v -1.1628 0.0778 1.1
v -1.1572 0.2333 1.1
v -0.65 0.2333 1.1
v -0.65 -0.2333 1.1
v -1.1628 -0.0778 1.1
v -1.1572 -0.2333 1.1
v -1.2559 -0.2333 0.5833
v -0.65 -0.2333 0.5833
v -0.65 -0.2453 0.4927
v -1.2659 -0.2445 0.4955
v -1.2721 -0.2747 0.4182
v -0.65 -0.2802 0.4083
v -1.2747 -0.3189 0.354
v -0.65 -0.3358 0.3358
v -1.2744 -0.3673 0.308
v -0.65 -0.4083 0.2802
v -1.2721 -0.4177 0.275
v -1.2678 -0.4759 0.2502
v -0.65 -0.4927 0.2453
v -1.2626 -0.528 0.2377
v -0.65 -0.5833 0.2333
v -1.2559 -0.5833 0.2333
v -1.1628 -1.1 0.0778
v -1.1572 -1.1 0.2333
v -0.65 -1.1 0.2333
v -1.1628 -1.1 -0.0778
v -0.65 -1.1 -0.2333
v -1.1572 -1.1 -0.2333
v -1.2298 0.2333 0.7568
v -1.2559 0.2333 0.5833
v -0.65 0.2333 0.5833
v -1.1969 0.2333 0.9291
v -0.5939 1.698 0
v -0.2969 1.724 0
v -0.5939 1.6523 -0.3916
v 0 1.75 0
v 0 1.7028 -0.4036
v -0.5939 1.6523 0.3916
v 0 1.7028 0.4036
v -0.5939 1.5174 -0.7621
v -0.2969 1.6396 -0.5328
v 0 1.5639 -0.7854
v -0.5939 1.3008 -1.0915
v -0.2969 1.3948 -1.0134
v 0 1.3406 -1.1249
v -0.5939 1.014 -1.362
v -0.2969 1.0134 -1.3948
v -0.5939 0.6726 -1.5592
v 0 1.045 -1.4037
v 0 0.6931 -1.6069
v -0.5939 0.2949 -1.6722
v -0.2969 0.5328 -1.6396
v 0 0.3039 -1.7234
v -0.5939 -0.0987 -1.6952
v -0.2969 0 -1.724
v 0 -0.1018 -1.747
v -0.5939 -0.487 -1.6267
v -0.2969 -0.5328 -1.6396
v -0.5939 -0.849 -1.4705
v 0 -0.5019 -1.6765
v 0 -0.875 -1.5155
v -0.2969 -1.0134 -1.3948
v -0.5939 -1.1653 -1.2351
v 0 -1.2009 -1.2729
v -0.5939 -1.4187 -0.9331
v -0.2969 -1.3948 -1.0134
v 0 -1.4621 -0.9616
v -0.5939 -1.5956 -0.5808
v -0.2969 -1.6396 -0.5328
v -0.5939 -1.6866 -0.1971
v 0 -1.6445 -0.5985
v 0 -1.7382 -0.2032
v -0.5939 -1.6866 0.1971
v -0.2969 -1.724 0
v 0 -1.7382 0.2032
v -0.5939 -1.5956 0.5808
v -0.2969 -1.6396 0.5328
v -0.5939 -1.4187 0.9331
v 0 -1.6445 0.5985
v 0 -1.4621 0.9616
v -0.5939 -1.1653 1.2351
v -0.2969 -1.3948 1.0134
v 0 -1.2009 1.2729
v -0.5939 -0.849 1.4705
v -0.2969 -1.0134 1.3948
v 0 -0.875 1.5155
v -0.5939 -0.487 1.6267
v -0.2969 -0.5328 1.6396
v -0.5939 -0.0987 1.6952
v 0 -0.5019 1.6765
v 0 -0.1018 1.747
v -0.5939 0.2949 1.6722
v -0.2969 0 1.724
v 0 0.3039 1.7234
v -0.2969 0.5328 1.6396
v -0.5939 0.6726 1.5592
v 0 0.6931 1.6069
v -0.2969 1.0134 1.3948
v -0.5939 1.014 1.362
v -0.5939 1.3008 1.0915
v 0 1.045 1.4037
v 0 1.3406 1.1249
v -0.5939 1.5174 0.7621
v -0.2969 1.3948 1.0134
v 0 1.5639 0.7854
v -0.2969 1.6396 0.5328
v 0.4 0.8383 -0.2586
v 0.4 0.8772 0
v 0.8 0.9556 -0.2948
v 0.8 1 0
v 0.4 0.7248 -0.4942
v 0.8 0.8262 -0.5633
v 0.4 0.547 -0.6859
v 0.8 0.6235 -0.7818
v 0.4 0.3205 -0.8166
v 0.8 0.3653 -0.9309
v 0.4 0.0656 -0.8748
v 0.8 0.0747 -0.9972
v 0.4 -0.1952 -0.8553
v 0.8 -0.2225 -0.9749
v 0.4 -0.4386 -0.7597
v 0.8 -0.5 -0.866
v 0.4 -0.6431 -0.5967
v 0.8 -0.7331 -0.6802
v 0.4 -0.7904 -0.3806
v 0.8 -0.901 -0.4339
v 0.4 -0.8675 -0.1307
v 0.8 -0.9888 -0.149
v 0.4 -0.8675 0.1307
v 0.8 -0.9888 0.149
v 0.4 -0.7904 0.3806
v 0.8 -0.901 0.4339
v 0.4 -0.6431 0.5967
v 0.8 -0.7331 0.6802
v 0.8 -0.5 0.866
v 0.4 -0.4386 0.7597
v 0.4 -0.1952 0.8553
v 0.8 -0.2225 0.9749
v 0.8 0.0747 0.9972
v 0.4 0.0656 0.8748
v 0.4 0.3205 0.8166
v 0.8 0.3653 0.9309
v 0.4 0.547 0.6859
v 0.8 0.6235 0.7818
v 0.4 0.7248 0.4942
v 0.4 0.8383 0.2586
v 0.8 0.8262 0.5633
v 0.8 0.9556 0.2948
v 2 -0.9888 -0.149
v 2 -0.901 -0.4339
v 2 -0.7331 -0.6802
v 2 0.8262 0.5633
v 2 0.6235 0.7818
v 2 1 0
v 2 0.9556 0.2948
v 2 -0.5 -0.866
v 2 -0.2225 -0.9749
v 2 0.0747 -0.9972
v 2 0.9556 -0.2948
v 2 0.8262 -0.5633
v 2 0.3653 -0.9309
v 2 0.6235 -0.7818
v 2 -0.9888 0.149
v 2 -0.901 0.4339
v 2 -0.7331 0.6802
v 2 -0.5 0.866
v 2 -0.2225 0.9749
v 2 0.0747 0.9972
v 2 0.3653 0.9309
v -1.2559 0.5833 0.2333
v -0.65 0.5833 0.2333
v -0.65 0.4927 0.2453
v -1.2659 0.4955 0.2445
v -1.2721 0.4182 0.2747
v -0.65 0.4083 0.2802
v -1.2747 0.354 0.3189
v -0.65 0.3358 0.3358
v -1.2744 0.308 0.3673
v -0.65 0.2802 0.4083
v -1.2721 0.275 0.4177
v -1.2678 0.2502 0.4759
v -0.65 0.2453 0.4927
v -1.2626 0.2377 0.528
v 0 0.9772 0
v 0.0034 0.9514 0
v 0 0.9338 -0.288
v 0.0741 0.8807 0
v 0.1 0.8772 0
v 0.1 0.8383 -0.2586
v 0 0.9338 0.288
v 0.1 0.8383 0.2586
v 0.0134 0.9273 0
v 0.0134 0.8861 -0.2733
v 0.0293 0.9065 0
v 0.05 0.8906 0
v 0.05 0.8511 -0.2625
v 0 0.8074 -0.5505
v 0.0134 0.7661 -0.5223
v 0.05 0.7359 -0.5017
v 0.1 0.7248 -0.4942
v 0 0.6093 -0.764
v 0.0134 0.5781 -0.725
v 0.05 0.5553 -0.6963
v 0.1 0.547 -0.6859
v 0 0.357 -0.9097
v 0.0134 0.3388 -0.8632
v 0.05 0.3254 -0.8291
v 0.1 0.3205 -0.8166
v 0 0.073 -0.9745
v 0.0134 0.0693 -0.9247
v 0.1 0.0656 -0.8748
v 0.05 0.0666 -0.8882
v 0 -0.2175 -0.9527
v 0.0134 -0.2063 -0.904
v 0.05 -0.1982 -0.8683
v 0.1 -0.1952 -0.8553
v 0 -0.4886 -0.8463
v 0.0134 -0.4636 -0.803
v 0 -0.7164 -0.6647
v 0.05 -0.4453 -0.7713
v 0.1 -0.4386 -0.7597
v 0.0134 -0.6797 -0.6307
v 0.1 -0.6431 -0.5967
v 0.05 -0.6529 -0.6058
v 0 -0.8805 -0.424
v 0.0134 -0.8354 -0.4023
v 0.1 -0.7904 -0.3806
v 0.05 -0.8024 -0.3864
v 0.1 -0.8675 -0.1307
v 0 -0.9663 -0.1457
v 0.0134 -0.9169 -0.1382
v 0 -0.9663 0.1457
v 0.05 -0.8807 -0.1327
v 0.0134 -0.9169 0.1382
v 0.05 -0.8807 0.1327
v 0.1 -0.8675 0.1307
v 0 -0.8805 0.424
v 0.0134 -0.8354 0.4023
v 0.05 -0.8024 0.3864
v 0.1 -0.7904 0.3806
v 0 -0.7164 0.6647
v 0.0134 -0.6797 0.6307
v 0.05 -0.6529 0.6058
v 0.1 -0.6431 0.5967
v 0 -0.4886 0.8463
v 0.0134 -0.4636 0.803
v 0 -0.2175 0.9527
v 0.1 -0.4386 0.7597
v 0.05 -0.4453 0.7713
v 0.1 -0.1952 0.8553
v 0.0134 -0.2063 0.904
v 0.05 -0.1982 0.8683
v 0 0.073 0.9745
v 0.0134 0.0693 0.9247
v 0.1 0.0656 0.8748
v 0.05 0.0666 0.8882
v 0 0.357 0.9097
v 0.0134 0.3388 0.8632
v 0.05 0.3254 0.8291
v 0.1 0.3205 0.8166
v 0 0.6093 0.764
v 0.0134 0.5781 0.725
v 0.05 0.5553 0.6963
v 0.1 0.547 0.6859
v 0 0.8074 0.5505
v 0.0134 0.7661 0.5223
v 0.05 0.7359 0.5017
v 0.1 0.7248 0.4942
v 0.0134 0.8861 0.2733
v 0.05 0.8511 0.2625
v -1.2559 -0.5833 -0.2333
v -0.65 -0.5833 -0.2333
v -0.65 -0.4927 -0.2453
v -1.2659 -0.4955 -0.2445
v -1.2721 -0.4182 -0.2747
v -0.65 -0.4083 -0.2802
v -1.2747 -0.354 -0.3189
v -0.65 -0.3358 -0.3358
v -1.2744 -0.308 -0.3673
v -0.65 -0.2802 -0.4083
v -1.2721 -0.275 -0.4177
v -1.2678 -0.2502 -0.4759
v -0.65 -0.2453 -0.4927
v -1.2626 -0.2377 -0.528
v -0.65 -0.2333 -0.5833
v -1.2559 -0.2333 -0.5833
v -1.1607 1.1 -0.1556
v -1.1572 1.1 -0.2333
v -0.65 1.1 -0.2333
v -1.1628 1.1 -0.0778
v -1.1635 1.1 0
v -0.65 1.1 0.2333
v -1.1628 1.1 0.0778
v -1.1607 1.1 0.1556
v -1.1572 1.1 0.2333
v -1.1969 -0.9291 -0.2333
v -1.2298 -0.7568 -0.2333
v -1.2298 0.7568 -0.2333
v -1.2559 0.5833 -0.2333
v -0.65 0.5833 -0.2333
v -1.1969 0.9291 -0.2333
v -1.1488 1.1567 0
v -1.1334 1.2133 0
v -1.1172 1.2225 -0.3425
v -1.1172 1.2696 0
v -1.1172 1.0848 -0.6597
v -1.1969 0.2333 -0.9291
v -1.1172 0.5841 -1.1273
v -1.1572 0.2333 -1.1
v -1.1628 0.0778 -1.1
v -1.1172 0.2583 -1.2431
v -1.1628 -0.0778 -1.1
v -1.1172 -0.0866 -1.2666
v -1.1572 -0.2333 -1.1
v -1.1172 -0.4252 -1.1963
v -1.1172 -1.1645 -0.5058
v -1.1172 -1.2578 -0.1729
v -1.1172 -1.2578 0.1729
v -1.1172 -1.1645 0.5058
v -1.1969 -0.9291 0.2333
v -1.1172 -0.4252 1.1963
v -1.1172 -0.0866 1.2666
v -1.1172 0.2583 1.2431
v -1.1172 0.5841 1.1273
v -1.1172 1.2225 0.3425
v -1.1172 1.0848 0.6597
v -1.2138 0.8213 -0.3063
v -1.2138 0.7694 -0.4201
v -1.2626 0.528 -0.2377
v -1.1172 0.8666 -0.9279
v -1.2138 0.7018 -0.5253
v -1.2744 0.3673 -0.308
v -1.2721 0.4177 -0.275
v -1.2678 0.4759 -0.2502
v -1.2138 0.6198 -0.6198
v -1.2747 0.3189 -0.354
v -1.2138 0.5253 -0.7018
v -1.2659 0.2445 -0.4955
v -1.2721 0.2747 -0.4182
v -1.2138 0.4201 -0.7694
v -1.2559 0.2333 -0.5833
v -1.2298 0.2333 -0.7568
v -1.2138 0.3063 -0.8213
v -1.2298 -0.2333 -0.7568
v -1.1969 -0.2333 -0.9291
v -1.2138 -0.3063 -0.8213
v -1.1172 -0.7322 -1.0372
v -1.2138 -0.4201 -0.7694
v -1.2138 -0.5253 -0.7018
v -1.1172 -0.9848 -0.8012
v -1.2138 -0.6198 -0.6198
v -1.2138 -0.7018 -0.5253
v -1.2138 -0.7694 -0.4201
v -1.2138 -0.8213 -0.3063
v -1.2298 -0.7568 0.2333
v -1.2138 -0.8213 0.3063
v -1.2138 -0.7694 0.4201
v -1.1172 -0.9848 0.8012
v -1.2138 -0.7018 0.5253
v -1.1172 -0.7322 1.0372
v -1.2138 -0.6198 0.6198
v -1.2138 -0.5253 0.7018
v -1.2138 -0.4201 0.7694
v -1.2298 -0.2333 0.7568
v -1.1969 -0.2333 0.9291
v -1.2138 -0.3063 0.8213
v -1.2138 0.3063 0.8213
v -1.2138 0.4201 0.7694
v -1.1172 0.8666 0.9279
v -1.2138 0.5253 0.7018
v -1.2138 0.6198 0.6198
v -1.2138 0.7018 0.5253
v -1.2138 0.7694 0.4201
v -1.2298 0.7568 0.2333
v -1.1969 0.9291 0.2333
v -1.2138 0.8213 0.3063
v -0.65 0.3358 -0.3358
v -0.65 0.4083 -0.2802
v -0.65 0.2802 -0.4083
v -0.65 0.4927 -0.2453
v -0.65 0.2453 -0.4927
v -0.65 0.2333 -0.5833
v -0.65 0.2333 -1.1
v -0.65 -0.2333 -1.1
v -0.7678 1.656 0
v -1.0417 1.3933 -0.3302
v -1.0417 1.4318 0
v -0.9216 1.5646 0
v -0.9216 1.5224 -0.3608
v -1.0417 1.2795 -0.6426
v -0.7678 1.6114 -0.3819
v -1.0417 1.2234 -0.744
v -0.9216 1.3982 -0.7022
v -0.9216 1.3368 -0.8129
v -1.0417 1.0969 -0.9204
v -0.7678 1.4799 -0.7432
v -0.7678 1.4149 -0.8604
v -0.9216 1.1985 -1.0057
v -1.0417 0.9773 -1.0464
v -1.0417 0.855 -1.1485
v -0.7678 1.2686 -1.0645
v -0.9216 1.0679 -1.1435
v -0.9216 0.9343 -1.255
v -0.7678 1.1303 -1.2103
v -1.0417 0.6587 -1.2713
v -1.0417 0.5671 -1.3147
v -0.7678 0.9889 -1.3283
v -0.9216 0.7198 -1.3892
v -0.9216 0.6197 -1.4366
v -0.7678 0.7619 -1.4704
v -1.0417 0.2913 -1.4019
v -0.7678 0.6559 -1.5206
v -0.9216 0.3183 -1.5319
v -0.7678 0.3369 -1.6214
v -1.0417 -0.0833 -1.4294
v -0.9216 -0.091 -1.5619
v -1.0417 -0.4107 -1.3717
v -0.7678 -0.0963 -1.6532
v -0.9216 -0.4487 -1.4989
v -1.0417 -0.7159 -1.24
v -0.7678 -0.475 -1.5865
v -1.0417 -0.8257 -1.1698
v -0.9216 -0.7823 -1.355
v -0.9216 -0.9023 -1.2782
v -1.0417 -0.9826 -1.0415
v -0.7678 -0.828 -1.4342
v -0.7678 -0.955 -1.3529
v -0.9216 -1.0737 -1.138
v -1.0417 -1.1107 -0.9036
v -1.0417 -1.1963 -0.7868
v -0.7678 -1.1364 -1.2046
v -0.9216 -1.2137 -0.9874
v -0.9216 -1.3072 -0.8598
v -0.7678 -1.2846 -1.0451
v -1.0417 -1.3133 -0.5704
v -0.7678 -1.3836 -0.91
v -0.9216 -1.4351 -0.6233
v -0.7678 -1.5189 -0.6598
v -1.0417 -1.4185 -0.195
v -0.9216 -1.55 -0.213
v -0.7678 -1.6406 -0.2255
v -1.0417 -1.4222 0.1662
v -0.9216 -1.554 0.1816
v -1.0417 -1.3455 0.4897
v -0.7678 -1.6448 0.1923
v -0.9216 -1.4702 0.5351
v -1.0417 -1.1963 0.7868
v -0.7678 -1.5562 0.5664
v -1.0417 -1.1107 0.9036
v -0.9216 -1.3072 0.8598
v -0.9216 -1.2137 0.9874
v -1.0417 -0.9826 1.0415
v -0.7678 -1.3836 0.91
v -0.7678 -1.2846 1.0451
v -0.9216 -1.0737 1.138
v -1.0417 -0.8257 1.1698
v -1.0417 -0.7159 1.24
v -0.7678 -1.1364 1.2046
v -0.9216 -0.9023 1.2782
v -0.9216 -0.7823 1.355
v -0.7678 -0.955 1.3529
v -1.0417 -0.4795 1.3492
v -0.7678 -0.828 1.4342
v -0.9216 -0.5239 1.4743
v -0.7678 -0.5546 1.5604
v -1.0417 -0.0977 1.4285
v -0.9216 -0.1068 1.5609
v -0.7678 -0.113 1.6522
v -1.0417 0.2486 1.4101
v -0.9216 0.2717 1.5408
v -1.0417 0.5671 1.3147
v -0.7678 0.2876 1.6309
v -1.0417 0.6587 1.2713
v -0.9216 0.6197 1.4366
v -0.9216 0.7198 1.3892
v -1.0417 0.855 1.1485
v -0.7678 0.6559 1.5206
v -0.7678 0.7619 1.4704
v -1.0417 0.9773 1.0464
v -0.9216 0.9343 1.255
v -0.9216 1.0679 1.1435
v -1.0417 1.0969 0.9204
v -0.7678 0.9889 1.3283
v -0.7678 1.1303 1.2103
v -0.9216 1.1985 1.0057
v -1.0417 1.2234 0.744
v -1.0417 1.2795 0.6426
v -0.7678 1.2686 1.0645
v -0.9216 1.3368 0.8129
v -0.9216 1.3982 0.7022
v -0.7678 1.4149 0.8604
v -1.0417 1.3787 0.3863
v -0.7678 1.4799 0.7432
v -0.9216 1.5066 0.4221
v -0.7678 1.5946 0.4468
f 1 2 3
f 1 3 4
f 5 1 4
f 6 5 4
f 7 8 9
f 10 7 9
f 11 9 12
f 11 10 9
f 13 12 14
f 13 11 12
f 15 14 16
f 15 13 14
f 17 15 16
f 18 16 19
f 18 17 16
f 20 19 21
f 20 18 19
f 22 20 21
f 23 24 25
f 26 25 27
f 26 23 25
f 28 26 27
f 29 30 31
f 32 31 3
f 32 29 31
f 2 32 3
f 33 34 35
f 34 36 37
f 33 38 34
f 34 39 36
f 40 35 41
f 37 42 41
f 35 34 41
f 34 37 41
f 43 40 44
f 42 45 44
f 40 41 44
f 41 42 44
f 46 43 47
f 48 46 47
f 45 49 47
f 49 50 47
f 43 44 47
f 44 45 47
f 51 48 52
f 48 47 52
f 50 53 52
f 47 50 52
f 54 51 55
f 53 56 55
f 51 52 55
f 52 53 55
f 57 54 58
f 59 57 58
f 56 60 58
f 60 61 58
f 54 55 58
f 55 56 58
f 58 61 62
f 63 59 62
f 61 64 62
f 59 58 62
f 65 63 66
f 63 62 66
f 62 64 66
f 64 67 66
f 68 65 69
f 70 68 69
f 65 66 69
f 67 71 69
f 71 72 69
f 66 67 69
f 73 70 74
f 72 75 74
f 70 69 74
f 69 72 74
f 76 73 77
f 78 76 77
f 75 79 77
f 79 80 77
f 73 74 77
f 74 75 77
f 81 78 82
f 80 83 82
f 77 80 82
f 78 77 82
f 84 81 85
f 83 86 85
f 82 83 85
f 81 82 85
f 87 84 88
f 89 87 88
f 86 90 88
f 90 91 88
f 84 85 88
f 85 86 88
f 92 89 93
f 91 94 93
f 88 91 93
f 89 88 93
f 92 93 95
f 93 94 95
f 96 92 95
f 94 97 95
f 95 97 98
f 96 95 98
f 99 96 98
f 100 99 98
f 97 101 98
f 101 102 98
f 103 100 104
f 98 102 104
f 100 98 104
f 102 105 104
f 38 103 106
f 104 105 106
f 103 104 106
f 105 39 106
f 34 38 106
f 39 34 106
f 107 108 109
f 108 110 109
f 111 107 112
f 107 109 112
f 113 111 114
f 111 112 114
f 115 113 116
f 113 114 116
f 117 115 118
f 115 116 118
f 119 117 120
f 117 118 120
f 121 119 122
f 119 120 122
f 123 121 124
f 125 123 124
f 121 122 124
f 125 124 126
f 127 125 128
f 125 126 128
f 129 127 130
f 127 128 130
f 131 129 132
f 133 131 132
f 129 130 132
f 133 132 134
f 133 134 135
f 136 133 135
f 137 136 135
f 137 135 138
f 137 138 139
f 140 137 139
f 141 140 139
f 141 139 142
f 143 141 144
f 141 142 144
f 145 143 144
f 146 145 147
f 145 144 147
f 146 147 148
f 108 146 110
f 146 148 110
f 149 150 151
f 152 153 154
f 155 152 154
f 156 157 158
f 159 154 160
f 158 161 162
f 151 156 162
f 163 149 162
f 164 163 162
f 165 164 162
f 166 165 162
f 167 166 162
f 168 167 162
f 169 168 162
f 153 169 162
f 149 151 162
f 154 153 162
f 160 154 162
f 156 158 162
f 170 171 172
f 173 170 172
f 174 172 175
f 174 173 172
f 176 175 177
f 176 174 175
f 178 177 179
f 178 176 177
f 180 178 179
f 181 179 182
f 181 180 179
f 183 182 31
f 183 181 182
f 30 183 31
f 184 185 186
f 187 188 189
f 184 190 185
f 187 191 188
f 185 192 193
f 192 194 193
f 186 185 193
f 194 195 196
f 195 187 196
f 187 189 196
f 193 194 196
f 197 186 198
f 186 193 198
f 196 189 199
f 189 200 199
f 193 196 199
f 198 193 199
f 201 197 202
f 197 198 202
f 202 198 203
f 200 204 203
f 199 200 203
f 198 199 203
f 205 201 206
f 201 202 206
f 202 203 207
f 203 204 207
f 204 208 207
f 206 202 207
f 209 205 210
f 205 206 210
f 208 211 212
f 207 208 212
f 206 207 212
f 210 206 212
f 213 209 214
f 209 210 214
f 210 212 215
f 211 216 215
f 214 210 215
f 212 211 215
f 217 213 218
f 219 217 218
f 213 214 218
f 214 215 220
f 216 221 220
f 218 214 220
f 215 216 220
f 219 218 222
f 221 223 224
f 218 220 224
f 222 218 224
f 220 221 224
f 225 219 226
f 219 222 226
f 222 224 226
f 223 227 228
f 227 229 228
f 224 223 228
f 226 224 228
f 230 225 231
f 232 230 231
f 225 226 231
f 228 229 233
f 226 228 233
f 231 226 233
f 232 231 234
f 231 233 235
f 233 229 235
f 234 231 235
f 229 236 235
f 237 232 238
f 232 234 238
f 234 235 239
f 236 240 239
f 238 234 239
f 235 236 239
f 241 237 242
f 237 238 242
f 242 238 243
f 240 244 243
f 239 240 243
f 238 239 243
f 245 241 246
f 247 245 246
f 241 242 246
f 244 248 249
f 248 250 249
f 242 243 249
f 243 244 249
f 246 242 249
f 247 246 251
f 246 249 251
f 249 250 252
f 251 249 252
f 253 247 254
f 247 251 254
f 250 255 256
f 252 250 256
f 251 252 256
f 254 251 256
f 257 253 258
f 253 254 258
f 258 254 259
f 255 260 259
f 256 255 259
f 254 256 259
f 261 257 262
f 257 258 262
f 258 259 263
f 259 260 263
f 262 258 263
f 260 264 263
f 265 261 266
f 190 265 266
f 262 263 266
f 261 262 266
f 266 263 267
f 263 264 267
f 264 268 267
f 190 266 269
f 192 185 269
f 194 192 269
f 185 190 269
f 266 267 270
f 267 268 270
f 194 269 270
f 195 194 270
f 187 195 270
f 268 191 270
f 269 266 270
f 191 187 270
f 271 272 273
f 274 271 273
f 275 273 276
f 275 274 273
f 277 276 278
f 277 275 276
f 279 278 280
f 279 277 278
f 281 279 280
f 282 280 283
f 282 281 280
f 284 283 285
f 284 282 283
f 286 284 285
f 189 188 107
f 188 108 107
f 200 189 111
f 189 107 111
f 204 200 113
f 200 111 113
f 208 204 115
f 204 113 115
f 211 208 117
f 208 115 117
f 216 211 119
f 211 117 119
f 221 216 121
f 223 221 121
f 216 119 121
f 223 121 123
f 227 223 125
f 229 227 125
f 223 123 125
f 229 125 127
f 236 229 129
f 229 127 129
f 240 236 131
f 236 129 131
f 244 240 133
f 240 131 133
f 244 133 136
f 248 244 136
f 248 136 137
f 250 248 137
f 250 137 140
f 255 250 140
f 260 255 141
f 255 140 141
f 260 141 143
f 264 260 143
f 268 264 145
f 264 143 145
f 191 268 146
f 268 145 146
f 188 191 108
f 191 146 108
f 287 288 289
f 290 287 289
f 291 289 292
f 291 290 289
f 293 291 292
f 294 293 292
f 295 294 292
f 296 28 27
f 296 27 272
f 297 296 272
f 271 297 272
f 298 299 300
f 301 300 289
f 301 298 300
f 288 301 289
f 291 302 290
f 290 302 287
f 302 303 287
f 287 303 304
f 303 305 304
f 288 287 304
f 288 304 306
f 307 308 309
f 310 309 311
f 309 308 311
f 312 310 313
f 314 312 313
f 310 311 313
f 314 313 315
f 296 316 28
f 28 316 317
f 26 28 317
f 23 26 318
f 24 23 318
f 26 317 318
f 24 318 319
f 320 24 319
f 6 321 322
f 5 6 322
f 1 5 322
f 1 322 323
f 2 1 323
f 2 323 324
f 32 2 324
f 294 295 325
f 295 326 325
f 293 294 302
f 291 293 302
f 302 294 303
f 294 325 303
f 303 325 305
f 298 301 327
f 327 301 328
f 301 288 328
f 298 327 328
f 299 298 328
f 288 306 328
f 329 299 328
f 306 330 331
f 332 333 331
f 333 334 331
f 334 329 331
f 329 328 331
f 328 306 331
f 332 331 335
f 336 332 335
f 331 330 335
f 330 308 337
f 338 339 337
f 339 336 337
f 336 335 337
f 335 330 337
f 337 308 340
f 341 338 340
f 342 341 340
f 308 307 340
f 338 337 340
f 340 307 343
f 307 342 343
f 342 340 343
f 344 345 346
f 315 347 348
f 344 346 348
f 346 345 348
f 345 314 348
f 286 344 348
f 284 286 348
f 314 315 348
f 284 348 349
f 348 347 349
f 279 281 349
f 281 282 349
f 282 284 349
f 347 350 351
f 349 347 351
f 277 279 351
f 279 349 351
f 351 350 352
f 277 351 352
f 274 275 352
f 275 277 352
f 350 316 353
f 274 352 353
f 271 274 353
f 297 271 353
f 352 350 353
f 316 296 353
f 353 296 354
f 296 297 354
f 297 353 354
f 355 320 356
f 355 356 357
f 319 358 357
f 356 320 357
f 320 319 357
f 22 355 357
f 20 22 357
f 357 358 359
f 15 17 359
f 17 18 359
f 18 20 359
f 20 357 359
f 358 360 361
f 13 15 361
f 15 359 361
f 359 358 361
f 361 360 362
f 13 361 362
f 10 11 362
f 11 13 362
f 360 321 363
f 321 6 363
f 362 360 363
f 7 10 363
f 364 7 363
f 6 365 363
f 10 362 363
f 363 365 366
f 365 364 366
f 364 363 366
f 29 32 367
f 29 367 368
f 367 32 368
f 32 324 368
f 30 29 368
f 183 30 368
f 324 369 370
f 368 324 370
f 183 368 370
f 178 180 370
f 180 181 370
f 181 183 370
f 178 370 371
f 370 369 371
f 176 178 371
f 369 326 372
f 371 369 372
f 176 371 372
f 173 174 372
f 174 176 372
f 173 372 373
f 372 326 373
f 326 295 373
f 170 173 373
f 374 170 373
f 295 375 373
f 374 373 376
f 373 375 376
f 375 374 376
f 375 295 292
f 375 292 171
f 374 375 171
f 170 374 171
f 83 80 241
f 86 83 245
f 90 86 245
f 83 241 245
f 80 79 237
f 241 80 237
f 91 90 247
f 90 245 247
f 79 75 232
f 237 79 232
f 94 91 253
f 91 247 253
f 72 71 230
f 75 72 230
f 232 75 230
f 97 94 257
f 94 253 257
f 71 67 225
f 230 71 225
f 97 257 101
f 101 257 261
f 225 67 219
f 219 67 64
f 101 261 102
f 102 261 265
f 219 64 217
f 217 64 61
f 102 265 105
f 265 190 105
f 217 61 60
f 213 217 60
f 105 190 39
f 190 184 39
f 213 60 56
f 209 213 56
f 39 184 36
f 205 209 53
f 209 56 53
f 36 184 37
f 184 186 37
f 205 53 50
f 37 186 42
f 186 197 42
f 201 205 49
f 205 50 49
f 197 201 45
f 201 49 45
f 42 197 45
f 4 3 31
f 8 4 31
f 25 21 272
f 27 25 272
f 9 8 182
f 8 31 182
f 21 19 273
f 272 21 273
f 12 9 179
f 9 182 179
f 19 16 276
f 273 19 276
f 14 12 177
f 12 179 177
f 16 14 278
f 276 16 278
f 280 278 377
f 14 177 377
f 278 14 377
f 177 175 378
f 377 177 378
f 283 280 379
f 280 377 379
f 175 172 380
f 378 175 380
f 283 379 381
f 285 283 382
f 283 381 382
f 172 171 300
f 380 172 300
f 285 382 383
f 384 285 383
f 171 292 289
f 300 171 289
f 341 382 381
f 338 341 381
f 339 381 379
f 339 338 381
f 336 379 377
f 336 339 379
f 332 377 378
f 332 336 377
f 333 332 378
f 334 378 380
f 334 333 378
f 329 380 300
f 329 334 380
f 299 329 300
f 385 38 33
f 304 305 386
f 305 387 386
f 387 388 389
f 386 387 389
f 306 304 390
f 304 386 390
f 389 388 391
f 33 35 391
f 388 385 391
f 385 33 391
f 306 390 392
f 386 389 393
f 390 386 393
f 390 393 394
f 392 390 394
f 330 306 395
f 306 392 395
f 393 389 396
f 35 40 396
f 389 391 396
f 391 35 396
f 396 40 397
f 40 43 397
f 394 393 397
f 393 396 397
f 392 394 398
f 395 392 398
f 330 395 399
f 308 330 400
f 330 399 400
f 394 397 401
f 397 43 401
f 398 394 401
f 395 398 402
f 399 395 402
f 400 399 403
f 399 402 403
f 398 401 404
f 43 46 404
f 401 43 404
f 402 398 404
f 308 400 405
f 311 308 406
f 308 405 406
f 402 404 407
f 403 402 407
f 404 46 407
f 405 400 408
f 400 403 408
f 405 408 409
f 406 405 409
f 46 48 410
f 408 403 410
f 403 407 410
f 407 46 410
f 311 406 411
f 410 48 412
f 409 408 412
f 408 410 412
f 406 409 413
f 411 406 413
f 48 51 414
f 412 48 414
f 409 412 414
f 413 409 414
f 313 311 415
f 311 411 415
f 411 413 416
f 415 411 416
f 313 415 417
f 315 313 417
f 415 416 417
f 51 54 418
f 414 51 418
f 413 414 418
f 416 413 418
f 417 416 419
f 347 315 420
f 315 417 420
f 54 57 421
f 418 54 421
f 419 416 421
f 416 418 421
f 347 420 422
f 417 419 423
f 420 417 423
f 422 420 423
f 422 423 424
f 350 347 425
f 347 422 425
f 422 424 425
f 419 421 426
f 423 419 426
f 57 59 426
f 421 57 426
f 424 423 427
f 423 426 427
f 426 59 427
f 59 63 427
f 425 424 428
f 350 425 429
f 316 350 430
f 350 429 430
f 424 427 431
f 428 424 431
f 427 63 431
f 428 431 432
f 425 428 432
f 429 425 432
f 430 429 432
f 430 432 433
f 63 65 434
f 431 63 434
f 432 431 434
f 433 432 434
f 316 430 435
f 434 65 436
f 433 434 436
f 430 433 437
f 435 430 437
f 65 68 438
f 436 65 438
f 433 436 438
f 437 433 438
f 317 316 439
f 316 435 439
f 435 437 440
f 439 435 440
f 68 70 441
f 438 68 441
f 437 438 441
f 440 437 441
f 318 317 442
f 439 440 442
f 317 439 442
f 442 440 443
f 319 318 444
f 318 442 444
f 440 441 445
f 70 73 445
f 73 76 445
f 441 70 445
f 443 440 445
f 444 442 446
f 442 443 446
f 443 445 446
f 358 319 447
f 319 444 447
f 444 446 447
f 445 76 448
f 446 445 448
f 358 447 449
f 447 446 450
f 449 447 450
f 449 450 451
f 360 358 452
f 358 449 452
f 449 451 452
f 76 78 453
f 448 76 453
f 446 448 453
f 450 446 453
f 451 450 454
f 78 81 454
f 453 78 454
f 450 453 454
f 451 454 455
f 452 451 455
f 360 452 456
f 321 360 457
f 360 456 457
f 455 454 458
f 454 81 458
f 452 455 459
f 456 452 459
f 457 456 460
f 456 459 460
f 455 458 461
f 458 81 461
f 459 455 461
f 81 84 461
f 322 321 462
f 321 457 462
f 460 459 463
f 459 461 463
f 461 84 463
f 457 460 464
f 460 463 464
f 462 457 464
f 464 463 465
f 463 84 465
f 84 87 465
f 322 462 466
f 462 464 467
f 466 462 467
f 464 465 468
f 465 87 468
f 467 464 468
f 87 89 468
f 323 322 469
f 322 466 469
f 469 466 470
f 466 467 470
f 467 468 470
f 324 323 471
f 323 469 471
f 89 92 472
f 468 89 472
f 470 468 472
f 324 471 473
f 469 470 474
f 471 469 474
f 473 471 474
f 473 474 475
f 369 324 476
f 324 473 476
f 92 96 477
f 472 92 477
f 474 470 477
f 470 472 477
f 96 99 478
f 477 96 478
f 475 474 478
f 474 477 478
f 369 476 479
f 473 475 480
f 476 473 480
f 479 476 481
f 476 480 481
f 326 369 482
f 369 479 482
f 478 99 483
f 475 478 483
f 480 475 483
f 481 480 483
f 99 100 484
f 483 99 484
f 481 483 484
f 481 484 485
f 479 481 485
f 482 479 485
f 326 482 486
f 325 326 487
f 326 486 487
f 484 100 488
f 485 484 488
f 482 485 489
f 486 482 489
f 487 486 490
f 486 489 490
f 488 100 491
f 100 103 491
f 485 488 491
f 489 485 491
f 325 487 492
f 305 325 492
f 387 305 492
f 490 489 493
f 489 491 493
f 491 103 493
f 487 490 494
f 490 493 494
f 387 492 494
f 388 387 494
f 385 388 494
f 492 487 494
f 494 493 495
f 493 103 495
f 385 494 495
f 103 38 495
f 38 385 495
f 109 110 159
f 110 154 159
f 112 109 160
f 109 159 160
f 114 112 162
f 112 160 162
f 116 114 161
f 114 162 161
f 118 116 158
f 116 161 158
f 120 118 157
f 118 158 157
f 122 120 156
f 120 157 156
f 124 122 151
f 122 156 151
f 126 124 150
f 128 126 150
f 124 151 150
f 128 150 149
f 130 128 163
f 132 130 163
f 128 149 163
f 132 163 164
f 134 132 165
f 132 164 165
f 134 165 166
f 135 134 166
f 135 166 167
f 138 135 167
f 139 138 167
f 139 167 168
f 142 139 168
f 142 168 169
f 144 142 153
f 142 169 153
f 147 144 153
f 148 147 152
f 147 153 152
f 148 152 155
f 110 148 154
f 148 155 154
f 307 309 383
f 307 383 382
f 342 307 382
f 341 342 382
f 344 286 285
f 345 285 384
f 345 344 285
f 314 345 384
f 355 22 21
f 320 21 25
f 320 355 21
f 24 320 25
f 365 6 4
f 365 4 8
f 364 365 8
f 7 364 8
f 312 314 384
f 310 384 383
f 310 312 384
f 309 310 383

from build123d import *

# Parameters (mm, degrees)
CUT_EXTRUDE_1_DEPTH = 0.65


with BuildPart() as part:
    # ｽｹｯﾁ1 → 回転1 (revolve)
    with BuildSketch(Plane.XY):
        with BuildLine():
            Line((-0.593854493, 1.698044464), (0, 1.75))
            Line((0, 1.75), (0, 0.97725))
            ThreePointArc((0, 0.97725), (0.029289322, 0.906539322), (0.1, 0.87725))
            Line((0.1, 0.87725), (0.4, 0.87725))
            Line((0.4, 0.87725), (0.8, 1))
            Line((0.8, 1), (2, 1))
            Line((2, 1), (2, 0))
            Line((2, 0), (-1.3, 0))
            ThreePointArc((-1.3, 0), (-1.254061978, 0.641351616), (-1.117185824, 1.269608821))
            ThreePointArc((-1.117185824, 1.269608821), (-0.921639459, 1.564590934), (-0.593854493, 1.698044464))
        make_face()
    revolve(axis=Axis((2, 0, 0), (-1, 0, 0)))

    # ｽｹｯﾁ2 → ｶｯﾄ - 押し出し1 (cut)
    with BuildSketch(Plane(origin=(-1.3, 0, 0), x_dir=(0, 0, -1), z_dir=(1, 0, 0))):
        with BuildLine():
            Line((-1.1, 0.233333333), (-1.1, -0.233333333))
            Line((-1.1, -0.233333333), (-0.583333333, -0.233333333))
            ThreePointArc((-0.583333333, -0.233333333), (-0.33584596, -0.33584596), (-0.233333333, -0.583333333))
            Line((-0.233333333, -0.583333333), (-0.233333333, -1.1))
            Line((-0.233333333, -1.1), (0.233333333, -1.1))
            Line((0.233333333, -1.1), (0.233333333, -0.583333333))
            ThreePointArc((0.233333333, -0.583333333), (0.33584596, -0.33584596), (0.583333333, -0.233333333))
            Line((0.583333333, -0.233333333), (1.1, -0.233333333))
            Line((1.1, -0.233333333), (1.1, 0.233333333))
            Line((1.1, 0.233333333), (0.583333333, 0.233333333))
            ThreePointArc((0.583333333, 0.233333333), (0.33584596, 0.33584596), (0.233333333, 0.583333333))
            Line((0.233333333, 0.583333333), (0.233333333, 1.1))
            Line((0.233333333, 1.1), (-0.233333333, 1.1))
            Line((-0.233333333, 1.1), (-0.233333333, 0.583333333))
            ThreePointArc((-0.233333333, 0.583333333), (-0.33584596, 0.33584596), (-0.583333333, 0.233333333))
            Line((-0.583333333, 0.233333333), (-1.1, 0.233333333))
        make_face()
    extrude(amount=CUT_EXTRUDE_1_DEPTH, mode=Mode.SUBTRACT)


solid = part.part
